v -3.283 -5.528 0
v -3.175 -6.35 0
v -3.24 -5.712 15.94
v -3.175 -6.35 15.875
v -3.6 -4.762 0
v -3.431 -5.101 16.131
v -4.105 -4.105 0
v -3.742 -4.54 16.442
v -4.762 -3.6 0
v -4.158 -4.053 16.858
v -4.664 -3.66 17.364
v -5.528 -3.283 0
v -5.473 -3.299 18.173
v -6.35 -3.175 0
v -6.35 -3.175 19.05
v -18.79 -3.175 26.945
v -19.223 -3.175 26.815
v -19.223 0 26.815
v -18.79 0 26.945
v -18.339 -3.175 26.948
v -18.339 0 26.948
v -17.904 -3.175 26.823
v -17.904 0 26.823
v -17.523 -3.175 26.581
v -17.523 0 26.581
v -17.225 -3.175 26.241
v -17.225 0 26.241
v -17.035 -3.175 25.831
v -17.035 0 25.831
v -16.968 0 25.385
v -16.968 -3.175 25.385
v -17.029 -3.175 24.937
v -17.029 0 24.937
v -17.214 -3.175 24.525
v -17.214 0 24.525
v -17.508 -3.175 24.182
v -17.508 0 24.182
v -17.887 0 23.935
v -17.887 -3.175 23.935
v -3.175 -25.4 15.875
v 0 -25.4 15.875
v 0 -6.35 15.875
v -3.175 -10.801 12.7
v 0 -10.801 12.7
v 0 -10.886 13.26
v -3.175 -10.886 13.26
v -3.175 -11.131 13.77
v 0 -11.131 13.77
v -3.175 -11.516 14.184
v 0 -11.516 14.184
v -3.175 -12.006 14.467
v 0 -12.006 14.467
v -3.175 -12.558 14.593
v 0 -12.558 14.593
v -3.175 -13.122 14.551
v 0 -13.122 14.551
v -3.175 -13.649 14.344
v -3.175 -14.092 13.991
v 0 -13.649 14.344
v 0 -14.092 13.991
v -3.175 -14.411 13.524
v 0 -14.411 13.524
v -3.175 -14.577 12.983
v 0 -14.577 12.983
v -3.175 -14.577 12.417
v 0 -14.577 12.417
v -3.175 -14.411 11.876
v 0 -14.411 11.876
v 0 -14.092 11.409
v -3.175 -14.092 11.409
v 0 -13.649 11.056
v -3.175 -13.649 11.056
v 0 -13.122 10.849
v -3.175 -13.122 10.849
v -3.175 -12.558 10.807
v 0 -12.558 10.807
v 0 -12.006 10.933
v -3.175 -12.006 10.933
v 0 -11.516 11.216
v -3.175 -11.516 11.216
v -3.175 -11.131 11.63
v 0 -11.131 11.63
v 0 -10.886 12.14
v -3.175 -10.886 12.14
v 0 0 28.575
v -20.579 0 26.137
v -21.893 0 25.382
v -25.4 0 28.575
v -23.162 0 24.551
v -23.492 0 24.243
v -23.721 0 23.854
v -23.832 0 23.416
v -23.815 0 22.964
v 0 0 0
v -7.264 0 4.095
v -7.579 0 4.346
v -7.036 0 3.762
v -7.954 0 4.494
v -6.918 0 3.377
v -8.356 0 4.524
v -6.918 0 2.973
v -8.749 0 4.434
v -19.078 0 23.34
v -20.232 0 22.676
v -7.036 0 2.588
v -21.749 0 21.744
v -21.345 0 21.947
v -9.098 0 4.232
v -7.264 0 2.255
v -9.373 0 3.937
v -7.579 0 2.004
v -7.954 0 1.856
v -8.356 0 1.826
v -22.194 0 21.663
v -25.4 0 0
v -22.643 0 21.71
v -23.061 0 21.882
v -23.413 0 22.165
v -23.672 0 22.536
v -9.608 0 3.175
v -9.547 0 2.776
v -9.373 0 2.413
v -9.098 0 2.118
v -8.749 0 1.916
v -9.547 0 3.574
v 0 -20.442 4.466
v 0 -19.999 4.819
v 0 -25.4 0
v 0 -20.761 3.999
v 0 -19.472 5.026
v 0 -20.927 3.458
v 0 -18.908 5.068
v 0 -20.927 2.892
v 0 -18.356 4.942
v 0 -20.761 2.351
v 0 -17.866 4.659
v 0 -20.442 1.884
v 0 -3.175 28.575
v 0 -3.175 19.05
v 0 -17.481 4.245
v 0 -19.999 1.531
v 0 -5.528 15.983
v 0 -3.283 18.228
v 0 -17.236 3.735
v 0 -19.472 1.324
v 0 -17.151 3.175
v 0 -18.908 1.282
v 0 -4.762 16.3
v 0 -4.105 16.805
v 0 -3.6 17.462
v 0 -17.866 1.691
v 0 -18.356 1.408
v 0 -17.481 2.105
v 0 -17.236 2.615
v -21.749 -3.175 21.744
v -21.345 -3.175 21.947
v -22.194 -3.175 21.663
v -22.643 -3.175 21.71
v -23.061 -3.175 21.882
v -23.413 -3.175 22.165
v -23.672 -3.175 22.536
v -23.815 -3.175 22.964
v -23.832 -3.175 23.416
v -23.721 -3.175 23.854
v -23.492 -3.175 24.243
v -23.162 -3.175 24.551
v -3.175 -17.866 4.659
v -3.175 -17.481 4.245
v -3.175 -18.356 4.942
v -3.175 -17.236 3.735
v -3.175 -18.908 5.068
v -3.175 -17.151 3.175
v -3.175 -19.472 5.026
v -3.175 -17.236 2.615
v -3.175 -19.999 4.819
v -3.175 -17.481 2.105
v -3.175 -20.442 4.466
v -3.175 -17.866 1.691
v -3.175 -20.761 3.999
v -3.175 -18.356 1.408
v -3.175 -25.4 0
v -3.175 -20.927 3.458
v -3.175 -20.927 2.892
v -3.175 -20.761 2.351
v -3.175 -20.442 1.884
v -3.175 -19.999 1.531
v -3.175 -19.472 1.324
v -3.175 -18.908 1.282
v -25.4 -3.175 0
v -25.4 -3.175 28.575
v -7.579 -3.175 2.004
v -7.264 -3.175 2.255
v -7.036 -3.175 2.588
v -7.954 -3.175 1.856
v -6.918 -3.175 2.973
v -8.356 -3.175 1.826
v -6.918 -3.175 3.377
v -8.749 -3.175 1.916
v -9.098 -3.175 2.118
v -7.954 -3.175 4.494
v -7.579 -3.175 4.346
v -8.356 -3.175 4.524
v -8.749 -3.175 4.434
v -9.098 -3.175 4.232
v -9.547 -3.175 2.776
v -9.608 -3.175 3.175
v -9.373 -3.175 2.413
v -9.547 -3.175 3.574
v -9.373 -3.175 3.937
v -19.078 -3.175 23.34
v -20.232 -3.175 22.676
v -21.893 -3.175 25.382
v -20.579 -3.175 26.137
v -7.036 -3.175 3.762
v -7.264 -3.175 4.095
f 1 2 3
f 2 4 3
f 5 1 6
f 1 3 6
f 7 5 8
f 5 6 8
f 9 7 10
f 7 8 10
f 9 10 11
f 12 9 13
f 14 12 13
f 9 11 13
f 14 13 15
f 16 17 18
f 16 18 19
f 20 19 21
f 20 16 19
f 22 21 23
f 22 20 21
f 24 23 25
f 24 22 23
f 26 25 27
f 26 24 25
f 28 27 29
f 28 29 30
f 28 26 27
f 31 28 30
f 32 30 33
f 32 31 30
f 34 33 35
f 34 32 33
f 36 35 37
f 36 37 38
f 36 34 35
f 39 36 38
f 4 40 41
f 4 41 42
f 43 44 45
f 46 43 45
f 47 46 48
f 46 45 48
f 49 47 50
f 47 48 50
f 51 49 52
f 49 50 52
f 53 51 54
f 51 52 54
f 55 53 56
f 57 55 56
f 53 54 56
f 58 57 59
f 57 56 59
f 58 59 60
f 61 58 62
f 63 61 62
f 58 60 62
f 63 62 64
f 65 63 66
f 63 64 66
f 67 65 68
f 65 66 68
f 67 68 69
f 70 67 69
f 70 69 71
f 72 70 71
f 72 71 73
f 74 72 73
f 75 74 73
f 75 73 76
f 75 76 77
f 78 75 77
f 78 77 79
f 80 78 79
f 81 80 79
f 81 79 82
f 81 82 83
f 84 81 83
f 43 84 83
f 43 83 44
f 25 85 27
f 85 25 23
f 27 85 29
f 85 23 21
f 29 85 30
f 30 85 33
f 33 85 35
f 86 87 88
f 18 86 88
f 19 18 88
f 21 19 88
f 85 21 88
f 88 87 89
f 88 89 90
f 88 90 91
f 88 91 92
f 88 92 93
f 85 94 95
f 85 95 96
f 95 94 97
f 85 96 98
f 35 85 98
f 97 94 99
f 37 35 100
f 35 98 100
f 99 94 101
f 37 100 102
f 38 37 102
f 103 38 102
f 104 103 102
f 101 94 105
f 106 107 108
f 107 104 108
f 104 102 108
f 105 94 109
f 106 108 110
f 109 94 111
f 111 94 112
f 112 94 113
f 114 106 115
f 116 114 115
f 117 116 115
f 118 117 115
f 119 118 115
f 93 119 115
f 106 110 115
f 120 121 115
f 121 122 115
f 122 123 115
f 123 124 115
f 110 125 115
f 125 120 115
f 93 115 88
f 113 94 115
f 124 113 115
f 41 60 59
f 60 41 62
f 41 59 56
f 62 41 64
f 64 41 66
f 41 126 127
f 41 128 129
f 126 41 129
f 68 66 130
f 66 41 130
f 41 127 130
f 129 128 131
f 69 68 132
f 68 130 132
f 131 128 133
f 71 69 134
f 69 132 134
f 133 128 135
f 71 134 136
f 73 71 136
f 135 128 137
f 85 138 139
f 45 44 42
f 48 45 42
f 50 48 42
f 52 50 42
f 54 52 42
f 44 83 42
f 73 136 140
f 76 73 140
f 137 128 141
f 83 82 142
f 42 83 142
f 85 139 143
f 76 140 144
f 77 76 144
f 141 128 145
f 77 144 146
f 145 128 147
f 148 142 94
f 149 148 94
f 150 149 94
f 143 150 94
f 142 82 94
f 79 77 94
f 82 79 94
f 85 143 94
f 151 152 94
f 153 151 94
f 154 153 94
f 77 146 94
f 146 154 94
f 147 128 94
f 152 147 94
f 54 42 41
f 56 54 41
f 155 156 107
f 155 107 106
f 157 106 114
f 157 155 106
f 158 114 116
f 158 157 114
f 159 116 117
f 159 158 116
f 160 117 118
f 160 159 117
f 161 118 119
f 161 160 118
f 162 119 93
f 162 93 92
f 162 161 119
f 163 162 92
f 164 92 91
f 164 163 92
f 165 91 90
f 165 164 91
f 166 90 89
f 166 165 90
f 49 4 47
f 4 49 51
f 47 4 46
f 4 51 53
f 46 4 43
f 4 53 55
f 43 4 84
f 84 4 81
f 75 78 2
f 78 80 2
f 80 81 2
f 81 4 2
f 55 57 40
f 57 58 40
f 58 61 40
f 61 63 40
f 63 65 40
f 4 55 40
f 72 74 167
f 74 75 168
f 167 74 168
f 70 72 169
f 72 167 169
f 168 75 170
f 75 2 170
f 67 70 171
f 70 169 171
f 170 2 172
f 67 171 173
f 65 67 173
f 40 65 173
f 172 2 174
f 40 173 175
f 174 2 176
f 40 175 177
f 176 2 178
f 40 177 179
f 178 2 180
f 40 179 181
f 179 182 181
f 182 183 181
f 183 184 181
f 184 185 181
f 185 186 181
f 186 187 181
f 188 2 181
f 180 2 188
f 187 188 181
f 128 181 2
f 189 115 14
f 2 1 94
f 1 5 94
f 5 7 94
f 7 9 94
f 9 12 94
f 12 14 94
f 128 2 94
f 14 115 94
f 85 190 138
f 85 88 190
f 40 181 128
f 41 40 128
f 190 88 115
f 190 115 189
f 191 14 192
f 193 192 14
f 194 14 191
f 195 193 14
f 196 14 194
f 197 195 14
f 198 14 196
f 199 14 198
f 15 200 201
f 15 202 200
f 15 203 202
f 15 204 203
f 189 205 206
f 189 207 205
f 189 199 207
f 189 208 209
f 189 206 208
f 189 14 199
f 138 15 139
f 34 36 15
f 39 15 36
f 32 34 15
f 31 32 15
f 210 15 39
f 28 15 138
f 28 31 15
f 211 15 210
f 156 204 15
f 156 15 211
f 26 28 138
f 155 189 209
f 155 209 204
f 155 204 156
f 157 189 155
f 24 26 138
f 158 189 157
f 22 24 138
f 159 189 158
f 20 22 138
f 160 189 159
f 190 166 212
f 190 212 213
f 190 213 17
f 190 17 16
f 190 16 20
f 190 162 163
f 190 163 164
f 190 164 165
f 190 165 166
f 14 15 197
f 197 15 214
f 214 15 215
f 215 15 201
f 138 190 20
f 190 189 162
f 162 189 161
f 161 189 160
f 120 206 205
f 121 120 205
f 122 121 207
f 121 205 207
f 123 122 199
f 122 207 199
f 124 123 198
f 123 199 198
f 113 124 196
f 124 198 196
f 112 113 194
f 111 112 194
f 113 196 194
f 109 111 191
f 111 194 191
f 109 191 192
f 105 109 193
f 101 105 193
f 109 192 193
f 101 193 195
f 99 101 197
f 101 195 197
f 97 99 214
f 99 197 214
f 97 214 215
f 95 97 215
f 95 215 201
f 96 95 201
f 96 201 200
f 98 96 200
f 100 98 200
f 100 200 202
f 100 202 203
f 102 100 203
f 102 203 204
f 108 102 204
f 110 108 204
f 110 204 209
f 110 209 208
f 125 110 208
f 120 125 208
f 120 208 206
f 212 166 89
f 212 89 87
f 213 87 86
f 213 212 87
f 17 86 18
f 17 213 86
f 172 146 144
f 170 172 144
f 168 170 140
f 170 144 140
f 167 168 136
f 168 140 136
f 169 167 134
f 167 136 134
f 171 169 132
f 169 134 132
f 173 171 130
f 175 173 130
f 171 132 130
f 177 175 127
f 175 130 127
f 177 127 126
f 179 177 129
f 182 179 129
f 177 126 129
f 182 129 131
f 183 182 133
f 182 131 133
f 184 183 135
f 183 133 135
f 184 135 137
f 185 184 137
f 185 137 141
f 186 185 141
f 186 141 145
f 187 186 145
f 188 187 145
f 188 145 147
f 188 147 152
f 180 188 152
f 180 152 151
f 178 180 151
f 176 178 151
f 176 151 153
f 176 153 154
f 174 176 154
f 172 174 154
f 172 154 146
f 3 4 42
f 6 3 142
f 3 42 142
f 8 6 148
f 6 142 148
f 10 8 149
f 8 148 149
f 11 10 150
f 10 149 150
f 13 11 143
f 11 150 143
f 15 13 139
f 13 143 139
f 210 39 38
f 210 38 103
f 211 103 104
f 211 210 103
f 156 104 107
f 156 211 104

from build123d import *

# Parameters (mm, degrees)
BOSS_EXTRUDE1_DEPTH   = 28.575
F_6_32_TAPPED_HOLE1_D = 2.7051
F_6_CLEARANCE_HOLE1_D = 3.7973
SKETCH8_R             = 1.35255
CUT_EXTRUDE1_DEPTH    = 46.900442536
SKETCH9_W             = 12.7
SKETCH9_H             = 22.225
CUT_EXTRUDE2_DEPTH    = 45.22263278
FILLET1_R             = 3.175


with BuildPart() as part:
    # Sketch1 → Boss-Extrude1 (new body)
    with BuildSketch(Plane.XY):
        Polygon((0, -25.4), (0, 0), (-25.4, 0), (-25.4, -3.175), (-3.175, -3.175), (-3.175, -25.4), align=None)
    extrude(amount=BOSS_EXTRUDE1_DEPTH)

    # #6-32 Tapped Hole1 (through all)
    with Locations(Plane(origin=(-8.255, 0, 3.175), x_dir=(1, 0, 0), z_dir=(0, 1, 0))):
        with Locations((0, 0), (-10.3, -22.2)):
            Hole(F_6_32_TAPPED_HOLE1_D / 2)

    # #6 Clearance Hole1 (through all)
    with Locations(Plane(origin=(-3.175, -12.7, 12.7), x_dir=(0, -1, 0), z_dir=(-1, 0, 0))):
        with Locations((0, 0), (6.35, -9.525)):
            Hole(F_6_CLEARANCE_HOLE1_D / 2)

    # Sketch8 → Cut-Extrude1 (cut, through all)
    with BuildSketch(Plane(origin=(0, 0, 0), x_dir=(1, 0, 0), z_dir=(0, 1, 0))):
        with BuildLine():
            ThreePointArc((-17.886866841, -23.934946413), (-19.659563303, -23.016475999), (-21.345464145, -21.946999958))
            ThreePointArc((-21.345464145, -21.946999958), (-23.555665329, -22.341110631), (-23.161554656, -24.551311816))
            ThreePointArc((-23.161554656, -24.551311816), (-21.241762383, -25.769160338), (-19.223133007, -26.815053657))
            ThreePointArc((-19.223133007, -26.815053657), (-17.114946378, -26.043133083), (-17.886866841, -23.934946413))
        make_face()
        with Locations((-18.555, -25.375)):
            Circle(SKETCH8_R, mode=Mode.SUBTRACT)
    extrude(amount=-CUT_EXTRUDE1_DEPTH, mode=Mode.SUBTRACT)

    # Sketch9 → Cut-Extrude2 (cut, through all)
    with BuildSketch(Plane.ZY.offset(3.175)):
        with Locations((22.225, -14.2875)):
            Rectangle(SKETCH9_W, SKETCH9_H)
    extrude(amount=-CUT_EXTRUDE2_DEPTH, mode=Mode.SUBTRACT)

    # Fillet1
    fillet1_edges = [part.edges().sort_by_distance(p)[0] for p in [
        (-3.175, -3.175, 7.9375),
        (-1.5875, -3.175, 15.875),
    ]]
    fillet(fillet1_edges, radius=FILLET1_R)


solid = part.part
